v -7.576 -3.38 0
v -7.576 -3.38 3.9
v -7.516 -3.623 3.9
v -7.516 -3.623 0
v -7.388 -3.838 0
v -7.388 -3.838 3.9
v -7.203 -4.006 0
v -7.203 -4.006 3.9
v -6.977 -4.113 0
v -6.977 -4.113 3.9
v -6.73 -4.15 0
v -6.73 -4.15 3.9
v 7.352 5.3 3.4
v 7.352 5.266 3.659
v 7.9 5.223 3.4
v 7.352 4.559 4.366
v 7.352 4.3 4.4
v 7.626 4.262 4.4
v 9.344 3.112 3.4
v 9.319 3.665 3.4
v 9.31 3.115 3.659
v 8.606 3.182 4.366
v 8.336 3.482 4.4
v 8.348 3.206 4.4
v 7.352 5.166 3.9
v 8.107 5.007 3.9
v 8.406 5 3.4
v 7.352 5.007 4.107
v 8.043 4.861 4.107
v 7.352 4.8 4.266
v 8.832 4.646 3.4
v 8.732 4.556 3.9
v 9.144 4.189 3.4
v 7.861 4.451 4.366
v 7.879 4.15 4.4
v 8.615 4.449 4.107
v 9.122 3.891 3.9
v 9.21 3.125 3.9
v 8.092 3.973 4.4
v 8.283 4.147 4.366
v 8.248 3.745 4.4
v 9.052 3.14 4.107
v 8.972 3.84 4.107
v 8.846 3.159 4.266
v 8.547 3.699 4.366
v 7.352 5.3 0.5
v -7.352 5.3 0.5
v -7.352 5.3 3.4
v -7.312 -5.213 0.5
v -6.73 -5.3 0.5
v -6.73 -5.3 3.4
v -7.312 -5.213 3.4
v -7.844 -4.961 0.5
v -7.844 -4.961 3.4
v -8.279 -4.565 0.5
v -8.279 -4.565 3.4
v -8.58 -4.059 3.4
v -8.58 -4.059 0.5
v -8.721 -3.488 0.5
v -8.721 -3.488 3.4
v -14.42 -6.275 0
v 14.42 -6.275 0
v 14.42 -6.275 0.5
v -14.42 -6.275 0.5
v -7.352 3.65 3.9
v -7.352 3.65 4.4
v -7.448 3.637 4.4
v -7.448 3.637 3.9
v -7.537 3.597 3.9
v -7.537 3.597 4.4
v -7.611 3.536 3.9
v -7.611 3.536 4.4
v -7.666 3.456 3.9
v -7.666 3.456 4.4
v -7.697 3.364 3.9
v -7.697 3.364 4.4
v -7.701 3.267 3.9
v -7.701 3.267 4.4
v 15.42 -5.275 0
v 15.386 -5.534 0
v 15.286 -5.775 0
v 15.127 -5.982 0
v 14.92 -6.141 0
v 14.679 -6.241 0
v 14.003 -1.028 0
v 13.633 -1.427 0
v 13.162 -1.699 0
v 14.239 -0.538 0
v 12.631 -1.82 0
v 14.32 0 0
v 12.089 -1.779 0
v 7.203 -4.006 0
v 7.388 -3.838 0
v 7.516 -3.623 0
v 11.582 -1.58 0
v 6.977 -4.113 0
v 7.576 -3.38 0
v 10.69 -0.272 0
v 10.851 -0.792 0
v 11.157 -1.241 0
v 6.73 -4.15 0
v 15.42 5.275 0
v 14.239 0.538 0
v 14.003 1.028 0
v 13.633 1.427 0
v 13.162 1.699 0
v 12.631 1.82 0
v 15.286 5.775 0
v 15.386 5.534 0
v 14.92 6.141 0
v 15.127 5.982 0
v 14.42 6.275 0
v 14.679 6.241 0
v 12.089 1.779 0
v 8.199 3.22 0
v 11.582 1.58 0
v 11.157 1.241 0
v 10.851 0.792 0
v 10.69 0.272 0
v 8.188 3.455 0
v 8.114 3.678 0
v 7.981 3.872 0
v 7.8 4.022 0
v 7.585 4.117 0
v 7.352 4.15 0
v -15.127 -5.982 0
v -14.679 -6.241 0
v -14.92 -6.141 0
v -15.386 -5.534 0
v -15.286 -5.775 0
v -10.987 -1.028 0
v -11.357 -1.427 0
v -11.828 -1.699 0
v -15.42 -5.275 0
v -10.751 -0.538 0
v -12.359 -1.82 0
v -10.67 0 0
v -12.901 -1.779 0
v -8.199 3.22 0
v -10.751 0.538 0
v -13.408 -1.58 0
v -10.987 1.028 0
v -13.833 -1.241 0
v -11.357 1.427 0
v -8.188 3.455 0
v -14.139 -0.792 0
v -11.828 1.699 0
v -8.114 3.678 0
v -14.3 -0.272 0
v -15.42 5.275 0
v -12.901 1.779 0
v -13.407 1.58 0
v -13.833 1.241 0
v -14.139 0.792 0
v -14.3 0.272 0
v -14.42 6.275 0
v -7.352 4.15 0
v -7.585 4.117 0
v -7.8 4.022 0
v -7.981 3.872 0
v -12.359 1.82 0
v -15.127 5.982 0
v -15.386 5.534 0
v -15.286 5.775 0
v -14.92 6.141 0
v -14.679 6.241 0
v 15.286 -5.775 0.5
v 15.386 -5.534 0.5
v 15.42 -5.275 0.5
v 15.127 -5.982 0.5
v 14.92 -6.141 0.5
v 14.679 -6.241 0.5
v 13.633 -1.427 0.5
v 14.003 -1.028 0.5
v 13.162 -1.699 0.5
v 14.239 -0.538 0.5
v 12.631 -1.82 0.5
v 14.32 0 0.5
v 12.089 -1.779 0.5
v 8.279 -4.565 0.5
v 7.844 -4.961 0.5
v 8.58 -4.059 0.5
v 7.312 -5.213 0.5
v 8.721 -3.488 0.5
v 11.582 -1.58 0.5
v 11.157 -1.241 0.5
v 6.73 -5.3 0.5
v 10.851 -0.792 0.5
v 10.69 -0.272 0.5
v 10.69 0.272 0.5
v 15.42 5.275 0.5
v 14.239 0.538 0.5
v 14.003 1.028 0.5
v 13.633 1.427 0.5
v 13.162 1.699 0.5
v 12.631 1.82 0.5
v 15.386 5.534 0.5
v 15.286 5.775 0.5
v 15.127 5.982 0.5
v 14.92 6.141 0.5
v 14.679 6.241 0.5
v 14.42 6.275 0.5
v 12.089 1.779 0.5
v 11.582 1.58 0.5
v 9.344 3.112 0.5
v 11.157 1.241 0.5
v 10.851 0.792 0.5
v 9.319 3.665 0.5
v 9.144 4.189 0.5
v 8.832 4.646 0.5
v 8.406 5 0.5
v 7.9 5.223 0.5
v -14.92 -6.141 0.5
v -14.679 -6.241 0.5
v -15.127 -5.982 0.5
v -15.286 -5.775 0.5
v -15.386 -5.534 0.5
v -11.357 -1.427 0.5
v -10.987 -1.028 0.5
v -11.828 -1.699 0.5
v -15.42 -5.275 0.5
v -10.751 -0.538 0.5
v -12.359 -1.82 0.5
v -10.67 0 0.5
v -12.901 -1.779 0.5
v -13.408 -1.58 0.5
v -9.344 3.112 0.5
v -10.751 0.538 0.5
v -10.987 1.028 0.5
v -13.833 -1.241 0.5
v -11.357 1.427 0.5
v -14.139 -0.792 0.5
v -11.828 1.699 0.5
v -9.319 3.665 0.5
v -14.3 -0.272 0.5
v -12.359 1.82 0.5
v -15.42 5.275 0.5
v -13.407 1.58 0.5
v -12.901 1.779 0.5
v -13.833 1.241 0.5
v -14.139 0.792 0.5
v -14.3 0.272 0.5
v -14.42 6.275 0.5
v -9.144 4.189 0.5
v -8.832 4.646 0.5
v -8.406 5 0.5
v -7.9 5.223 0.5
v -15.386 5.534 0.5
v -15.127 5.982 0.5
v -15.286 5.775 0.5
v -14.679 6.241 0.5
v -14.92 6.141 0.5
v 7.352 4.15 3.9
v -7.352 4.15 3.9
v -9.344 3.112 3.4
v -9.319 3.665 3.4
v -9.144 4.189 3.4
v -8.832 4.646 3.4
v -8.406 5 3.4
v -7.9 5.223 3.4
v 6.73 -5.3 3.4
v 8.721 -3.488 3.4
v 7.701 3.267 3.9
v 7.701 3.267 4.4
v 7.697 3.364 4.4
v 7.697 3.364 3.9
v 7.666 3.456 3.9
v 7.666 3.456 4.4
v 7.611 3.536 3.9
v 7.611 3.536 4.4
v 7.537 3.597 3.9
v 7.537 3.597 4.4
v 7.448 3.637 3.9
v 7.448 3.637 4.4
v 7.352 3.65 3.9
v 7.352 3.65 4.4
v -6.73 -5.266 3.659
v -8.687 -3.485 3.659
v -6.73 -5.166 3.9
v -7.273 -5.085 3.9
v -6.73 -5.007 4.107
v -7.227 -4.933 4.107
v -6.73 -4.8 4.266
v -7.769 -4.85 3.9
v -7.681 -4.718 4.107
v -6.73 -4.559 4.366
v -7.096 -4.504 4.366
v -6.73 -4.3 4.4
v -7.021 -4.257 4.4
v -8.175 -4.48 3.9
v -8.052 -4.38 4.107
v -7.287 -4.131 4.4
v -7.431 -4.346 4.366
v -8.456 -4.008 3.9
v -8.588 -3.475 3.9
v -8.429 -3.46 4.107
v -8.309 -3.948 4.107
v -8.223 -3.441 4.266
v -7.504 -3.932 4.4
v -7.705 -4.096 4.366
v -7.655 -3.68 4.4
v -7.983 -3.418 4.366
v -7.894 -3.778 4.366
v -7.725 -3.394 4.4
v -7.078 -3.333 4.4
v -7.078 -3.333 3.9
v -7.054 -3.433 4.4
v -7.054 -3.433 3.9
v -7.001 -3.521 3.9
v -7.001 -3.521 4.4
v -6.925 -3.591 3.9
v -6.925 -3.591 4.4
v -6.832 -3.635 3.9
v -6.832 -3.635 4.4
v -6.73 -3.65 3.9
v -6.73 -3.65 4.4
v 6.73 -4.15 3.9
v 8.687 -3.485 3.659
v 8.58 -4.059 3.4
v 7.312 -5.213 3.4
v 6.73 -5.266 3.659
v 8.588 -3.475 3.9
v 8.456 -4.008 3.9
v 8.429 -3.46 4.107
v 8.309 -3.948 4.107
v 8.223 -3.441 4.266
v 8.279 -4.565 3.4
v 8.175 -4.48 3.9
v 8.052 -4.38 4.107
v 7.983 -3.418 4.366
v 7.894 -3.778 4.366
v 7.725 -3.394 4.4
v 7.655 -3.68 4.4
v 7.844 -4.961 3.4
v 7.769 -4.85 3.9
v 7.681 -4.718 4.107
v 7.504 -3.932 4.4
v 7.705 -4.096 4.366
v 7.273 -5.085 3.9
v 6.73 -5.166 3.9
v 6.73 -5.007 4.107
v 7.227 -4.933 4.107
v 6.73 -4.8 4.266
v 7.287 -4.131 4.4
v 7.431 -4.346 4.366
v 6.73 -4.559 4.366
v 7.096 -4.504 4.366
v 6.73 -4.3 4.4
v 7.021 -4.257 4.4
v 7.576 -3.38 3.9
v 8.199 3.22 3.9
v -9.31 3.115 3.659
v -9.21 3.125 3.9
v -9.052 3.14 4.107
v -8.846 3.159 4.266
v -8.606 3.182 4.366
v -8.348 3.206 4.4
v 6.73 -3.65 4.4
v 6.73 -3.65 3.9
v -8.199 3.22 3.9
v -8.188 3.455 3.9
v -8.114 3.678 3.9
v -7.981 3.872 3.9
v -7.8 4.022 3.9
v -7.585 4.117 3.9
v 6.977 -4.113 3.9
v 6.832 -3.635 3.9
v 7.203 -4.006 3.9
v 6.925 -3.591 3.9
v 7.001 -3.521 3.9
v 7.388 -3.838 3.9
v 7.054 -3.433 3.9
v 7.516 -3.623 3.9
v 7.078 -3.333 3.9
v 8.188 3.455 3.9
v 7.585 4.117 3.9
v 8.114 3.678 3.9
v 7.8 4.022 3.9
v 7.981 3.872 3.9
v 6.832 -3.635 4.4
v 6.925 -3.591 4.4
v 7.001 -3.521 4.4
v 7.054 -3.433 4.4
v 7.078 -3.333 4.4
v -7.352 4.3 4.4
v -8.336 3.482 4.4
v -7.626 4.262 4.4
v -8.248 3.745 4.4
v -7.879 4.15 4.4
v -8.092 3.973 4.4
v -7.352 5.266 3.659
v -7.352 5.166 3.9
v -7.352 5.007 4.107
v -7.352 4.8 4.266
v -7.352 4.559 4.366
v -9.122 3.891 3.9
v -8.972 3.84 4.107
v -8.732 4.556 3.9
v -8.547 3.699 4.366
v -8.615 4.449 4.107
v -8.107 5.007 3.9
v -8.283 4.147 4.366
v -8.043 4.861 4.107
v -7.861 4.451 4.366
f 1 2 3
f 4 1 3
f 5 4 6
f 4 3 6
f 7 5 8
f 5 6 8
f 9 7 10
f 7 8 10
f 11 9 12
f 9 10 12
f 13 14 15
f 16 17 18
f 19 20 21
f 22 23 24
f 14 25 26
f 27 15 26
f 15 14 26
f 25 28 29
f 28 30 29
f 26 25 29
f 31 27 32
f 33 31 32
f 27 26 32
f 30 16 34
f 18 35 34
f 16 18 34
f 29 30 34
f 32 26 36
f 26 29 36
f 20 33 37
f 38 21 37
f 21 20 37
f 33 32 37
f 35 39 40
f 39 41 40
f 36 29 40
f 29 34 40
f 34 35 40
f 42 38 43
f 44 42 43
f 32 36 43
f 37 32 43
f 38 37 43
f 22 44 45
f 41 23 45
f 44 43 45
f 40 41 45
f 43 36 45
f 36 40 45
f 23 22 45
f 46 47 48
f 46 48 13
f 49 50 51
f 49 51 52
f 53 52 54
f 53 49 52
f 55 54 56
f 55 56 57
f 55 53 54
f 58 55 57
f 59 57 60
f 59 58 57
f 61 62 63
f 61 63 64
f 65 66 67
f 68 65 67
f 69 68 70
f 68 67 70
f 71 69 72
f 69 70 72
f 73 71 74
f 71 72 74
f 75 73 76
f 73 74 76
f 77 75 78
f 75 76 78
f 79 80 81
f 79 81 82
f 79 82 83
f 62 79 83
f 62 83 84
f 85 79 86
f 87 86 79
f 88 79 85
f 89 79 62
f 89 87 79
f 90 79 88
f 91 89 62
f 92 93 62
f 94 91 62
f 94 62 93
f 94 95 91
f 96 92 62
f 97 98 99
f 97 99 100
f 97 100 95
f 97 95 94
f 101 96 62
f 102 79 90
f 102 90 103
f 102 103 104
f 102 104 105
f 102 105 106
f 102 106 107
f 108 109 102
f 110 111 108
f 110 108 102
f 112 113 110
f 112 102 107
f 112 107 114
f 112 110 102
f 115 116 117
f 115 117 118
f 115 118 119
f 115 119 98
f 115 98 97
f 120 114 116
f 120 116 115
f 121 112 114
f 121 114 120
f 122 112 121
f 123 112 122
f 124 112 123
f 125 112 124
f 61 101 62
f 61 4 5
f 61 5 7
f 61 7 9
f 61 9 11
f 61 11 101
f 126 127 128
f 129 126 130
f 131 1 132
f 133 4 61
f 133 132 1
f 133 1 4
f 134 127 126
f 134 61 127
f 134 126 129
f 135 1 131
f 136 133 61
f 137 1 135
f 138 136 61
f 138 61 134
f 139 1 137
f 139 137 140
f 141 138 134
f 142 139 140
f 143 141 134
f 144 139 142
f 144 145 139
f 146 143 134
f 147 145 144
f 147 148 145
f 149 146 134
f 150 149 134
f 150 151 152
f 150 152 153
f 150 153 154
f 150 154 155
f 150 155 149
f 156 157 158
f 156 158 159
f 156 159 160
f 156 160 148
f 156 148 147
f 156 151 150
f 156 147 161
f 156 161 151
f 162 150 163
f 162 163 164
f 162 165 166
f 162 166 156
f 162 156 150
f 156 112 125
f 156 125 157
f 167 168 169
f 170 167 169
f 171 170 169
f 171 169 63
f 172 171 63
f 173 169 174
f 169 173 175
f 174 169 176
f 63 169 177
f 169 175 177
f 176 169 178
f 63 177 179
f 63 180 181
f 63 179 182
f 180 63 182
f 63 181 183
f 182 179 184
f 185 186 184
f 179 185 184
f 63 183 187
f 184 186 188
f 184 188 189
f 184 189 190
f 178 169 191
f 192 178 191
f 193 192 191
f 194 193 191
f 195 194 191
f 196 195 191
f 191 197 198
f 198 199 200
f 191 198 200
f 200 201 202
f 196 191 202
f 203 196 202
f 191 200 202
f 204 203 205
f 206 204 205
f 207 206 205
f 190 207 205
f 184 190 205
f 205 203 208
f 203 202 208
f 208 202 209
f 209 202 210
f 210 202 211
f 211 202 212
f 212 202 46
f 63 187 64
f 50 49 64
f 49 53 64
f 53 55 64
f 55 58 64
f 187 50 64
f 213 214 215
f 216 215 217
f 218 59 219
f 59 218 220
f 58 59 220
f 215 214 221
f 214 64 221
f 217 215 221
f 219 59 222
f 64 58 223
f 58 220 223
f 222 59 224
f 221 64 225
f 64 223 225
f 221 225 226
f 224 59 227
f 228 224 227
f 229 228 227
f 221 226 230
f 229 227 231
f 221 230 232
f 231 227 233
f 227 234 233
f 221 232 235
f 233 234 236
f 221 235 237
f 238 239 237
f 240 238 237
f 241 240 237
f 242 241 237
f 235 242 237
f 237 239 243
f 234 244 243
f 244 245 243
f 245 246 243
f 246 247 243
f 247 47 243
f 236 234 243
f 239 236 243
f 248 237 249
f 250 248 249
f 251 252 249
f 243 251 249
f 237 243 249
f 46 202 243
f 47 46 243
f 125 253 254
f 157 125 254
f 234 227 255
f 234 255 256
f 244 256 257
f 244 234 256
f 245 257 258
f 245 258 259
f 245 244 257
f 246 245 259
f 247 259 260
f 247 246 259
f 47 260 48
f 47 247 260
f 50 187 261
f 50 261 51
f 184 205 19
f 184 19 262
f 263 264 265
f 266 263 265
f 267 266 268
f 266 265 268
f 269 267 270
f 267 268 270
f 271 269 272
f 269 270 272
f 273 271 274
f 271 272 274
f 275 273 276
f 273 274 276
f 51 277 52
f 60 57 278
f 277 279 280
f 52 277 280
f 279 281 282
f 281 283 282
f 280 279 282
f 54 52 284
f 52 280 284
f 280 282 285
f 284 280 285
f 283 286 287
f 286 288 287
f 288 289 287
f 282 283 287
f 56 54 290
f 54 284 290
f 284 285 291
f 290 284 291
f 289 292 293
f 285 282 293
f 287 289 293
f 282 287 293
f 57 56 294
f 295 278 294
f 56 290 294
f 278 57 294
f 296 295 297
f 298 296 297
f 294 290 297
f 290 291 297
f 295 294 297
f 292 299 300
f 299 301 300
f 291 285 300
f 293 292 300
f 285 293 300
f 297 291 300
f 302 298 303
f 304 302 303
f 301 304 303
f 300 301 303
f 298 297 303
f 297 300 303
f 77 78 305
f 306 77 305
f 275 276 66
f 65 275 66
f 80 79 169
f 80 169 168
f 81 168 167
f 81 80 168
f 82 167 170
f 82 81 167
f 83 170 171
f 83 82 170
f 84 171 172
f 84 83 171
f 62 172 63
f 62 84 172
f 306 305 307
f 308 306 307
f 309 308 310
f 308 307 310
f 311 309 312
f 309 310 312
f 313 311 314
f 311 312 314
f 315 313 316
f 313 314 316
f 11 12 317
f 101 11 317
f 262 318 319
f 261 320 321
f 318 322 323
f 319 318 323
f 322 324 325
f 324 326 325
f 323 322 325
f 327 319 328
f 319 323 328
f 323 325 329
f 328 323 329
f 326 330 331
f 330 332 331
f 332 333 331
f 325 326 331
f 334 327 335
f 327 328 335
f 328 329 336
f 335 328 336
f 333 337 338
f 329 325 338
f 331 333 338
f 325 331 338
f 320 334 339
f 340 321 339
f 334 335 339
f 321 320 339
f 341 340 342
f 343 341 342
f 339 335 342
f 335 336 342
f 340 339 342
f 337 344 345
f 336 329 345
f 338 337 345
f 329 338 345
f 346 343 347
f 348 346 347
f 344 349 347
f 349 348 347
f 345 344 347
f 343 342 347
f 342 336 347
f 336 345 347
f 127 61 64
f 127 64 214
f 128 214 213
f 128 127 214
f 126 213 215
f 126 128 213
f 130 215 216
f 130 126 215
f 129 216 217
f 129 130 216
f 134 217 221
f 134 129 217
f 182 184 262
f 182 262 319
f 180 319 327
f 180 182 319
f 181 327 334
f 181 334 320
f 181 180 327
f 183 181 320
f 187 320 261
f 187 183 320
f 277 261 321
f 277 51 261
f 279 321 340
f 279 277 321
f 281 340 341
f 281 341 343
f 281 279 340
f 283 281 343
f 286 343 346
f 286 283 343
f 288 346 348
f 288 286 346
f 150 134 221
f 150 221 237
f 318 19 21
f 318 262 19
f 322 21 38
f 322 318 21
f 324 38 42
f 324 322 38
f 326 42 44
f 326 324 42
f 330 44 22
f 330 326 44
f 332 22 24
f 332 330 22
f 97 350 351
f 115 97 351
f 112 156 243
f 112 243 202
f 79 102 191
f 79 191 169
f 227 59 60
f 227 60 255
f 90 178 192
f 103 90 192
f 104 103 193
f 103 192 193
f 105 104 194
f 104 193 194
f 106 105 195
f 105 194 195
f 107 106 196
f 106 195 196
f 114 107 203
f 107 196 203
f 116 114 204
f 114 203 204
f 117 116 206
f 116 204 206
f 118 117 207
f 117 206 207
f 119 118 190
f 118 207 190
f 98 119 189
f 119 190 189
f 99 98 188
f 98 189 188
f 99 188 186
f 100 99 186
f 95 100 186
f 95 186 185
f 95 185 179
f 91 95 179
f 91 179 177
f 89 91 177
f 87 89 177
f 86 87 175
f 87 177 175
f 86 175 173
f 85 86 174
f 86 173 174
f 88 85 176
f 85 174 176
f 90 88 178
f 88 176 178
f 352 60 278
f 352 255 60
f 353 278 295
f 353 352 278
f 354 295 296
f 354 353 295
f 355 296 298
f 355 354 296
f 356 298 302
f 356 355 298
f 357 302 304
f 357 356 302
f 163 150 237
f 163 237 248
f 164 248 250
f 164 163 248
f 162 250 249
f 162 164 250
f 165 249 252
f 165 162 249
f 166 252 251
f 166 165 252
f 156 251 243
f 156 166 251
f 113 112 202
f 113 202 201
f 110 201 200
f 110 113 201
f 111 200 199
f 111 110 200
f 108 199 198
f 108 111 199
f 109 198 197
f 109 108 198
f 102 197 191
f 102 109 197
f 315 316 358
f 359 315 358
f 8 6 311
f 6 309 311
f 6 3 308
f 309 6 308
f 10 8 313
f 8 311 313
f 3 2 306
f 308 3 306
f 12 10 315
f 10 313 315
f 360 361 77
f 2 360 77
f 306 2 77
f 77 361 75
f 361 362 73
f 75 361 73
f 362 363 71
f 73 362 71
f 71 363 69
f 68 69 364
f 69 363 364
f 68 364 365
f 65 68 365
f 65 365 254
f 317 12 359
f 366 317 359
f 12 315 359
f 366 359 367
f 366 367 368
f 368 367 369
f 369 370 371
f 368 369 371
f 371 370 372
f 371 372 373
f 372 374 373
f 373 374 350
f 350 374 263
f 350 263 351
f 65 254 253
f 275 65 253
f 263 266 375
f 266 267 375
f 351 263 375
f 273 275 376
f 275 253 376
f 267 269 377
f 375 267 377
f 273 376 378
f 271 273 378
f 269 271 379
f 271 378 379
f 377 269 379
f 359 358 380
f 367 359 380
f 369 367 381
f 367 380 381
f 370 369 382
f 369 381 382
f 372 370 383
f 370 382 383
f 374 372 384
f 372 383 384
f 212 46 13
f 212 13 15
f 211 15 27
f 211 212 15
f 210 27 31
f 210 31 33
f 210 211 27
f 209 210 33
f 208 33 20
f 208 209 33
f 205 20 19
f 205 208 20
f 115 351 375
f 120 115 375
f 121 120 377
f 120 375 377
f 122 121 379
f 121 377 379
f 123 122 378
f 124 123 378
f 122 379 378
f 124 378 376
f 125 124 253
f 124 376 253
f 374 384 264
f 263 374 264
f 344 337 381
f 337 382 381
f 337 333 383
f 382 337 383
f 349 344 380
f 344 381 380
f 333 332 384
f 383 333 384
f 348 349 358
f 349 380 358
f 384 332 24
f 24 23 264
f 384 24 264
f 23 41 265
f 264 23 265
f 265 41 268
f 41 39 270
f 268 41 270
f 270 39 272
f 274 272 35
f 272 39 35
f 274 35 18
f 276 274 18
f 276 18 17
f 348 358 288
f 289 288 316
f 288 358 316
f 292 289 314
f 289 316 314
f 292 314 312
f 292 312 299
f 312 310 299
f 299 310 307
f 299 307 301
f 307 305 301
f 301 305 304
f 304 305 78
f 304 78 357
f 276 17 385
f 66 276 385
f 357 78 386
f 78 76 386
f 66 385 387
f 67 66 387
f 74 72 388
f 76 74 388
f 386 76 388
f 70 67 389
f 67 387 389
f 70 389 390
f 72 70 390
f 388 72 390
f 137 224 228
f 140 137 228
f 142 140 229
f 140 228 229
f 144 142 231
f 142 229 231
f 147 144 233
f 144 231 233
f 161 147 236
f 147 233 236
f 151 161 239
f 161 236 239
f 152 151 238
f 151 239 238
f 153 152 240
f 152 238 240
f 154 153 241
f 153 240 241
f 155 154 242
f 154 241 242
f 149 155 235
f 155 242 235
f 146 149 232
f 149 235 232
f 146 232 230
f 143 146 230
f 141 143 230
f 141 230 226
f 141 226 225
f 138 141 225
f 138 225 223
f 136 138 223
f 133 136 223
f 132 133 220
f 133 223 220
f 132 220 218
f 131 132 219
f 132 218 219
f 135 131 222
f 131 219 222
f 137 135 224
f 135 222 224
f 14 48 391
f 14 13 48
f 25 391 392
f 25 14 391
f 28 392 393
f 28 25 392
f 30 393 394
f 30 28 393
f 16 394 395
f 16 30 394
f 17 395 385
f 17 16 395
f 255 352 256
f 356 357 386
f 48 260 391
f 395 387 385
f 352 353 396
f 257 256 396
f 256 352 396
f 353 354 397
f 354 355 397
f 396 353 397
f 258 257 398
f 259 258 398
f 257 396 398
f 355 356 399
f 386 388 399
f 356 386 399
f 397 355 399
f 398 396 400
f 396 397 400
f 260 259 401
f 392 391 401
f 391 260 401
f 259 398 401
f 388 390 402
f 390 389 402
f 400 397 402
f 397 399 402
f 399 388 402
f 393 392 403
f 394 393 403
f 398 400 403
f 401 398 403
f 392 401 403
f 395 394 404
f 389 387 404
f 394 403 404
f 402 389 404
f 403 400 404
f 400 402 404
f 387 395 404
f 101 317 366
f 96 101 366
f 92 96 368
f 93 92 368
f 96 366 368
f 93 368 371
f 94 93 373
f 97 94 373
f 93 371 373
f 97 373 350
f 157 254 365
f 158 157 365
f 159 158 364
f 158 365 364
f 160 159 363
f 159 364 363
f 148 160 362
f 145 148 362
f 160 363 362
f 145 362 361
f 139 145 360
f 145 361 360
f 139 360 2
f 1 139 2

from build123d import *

# Parameters (mm, degrees)
BOSS_EXTRUDE1_DEPTH = 0.5
SKETCH2_R           = 1.825
CUT_EXTRUDE1_DEPTH  = 0.5
BOSS_EXTRUDE2_DEPTH = 3.9
CUT_EXTRUDE2_DEPTH  = 4.4
CUT_EXTRUDE3_DEPTH  = 3.9
FILLET1_R           = 1


with BuildPart() as part:
    # Sketch1 → Boss-Extrude1 (new body)
    with BuildSketch(Plane.XY):
        with BuildLine():
            Line((-14.42, 6.275), (14.42, 6.275))
            ThreePointArc((14.42, 6.275), (15.127106781, 5.982106781), (15.42, 5.275))
            Line((15.42, 5.275), (15.42, -5.275))
            ThreePointArc((15.42, -5.275), (15.127106781, -5.982106781), (14.42, -6.275))
            Line((14.42, -6.275), (-14.42, -6.275))
            ThreePointArc((-14.42, -6.275), (-15.127106781, -5.982106781), (-15.42, -5.275))
            Line((-15.42, -5.275), (-15.42, 5.275))
            ThreePointArc((-15.42, 5.275), (-15.127106781, 5.982106781), (-14.42, 6.275))
        make_face()
    extrude(amount=BOSS_EXTRUDE1_DEPTH)

    # Sketch2 → Cut-Extrude1 (cut)
    with BuildSketch(Plane.XY.offset(0.5)):
        with Locations((-12.495, 0)):
            Circle(SKETCH2_R)
        with Locations((12.495, 0)):
            Circle(SKETCH2_R)
    extrude(amount=-CUT_EXTRUDE1_DEPTH, mode=Mode.SUBTRACT)

    # Sketch3 → Boss-Extrude2 (add)
    with BuildSketch(Plane.XY.offset(0.5)):
        with BuildLine():
            Line((-7.352440505, 5.3), (7.352440505, 5.3))
            ThreePointArc((7.352440505, 5.3), (8.831577141, 4.646162996), (9.34359951, 3.112154811))
            Line((9.34359951, 3.112154811), (8.720958001, -3.487845189))
            ThreePointArc((8.720958001, -3.487845189), (8.075961991, -4.779136636), (6.729798996, -5.3))
            Line((6.729798996, -5.3), (-6.729798996, -5.3))
            ThreePointArc((-6.729798996, -5.3), (-8.075961991, -4.779136636), (-8.720958001, -3.487845189))
            Line((-8.720958001, -3.487845189), (-9.34359951, 3.112154811))
            ThreePointArc((-9.34359951, 3.112154811), (-8.831577141, 4.646162996), (-7.352440505, 5.3))
        make_face()
    extrude(amount=BOSS_EXTRUDE2_DEPTH)

    # Sketch4 → Cut-Extrude2 (cut)
    with BuildSketch(Plane.XY.offset(4.4)):
        with BuildLine():
            Line((7.078251822, -3.332872908), (7.700893331, 3.267127092))
            ThreePointArc((7.700893331, 3.267127092), (7.611289416, 3.535578524), (7.352440505, 3.65))
            Line((7.352440505, 3.65), (-7.352440505, 3.65))
            ThreePointArc((-7.352440505, 3.65), (-7.611289416, 3.535578524), (-7.700893331, 3.267127092))
            Line((-7.700893331, 3.267127092), (-7.078251822, -3.332872908))
            ThreePointArc((-7.078251822, -3.332872908), (-6.96537752, -3.558848911), (-6.729798996, -3.65))
            Line((-6.729798996, -3.65), (6.729798996, -3.65))
            ThreePointArc((6.729798996, -3.65), (6.96537752, -3.558848911), (7.078251822, -3.332872908))
        make_face()
    extrude(amount=-CUT_EXTRUDE2_DEPTH, mode=Mode.SUBTRACT)

    # Sketch5 → Cut-Extrude3 (cut)
    with BuildSketch(Plane.XY.offset(3.9)):
        with BuildLine():
            Line((7.352440505, 4.15), (-7.352440505, 4.15))
            ThreePointArc((-7.352440505, 4.15), (-7.981073576, 3.872119273), (-8.198683082, 3.220165795))
            Line((-8.198683082, 3.220165795), (-7.576041573, -3.379834205))
            ThreePointArc((-7.576041573, -3.379834205), (-7.301918269, -3.92863307), (-6.729798996, -4.15))
            Line((-6.729798996, -4.15), (6.729798996, -4.15))
            ThreePointArc((6.729798996, -4.15), (7.301918269, -3.92863307), (7.576041573, -3.379834205))
            Line((7.576041573, -3.379834205), (8.198683082, 3.220165795))
            ThreePointArc((8.198683082, 3.220165795), (7.981073576, 3.872119273), (7.352440505, 4.15))
        make_face()
        with BuildLine():
            Line((7.352440505, 3.65), (-7.352440505, 3.65))
            ThreePointArc((-7.352440505, 3.65), (-7.611289416, 3.535578524), (-7.700893331, 3.267127092))
            Line((-7.700893331, 3.267127092), (-7.078251822, -3.332872908))
            ThreePointArc((-7.078251822, -3.332872908), (-6.96537752, -3.558848911), (-6.729798996, -3.65))
            Line((-6.729798996, -3.65), (6.729798996, -3.65))
            ThreePointArc((6.729798996, -3.65), (6.96537752, -3.558848911), (7.078251822, -3.332872908))
            Line((7.078251822, -3.332872908), (7.700893331, 3.267127092))
            ThreePointArc((7.700893331, 3.267127092), (7.611289416, 3.535578524), (7.352440505, 3.65))
        make_face(mode=Mode.SUBTRACT)
    extrude(amount=-CUT_EXTRUDE3_DEPTH, mode=Mode.SUBTRACT)

    # Fillet1
    fillet1_edges = [part.edges().sort_by_distance(p)[0] for p in [
        (8.075961991, -4.779136636, 4.4),
        (9.032278756, -0.187845189, 4.4),
        (8.831577141, 4.646162996, 4.4),
        (0, 5.3, 4.4),
        (-8.831577141, 4.646162996, 4.4),
        (-9.032278756, -0.187845189, 4.4),
        (-8.075961991, -4.779136636, 4.4),
        (0, -5.3, 4.4),
    ]]
    fillet(fillet1_edges, radius=FILLET1_R)


solid = part.part
